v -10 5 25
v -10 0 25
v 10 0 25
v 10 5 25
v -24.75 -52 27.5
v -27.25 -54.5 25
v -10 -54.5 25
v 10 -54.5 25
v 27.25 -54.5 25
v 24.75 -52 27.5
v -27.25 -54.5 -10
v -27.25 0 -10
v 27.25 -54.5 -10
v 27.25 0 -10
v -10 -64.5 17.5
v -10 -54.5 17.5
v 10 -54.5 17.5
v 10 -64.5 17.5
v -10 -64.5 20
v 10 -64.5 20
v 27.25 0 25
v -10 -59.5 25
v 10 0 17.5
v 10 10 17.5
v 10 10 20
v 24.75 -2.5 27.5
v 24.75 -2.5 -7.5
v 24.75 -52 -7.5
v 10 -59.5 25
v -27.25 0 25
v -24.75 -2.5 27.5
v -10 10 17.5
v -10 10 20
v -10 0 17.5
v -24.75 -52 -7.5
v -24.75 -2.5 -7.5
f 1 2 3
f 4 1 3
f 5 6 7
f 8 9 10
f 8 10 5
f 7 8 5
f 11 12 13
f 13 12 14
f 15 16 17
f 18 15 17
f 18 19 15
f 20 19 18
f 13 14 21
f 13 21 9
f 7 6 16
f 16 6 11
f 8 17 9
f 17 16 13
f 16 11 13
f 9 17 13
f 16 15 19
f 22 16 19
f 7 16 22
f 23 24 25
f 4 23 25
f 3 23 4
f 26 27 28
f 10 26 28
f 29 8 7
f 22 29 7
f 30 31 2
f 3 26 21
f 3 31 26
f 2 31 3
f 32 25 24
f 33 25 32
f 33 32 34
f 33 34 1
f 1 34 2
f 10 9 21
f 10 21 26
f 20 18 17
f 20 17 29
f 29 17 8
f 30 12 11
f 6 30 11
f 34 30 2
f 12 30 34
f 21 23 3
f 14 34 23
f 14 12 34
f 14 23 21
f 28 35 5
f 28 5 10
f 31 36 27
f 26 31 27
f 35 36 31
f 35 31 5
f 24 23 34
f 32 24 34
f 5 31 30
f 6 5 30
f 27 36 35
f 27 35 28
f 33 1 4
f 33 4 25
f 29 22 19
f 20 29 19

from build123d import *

# Parameters (mm, degrees)
F0_W         = 54.5
F0_H         = 20
F1_DEPTH     = 54.5
F2_DEPTH     = 20
F3_T         = -2.5
F4_W         = 10
F4_H         = 7.5
F5_DEPTH     = 10
F6_W         = 10
F6_H         = 7.5
F7_DEPTH     = 10
F8_T1_DEPTH  = 45.7168298797
F8_T3_DEPTH  = 80.2168298797
F8_T8_DEPTH  = 80.2168298797
F8_T14_DEPTH = 80.2168298797
F8_T21_DEPTH = 80.2168298797
F8_T27_DEPTH = 80.2168298797
F8_T33_DEPTH = 80.2168298797
F8_T40_DEPTH = 80.2168298797


# Not quite as in the source:
# - a fillet or chamfer that OpenCascade refuses, or shapes differently, is made with other operations: its cross-section is extruded or revolved along the edge and cut away or added


with BuildPart() as f1:
    # F0 (on Front) → F1 (new body)
    with BuildSketch(Plane.XZ):
        Rectangle(F0_W, F0_H)
    extrude(amount=F1_DEPTH)

    # F2 (add): a face of the model
    f2_faces = [f1.faces().sort_by_distance(p)[0] for p in [
        (0, -27.25, 10),
    ]]
    extrude(f2_faces, amount=F2_DEPTH)

    # F3
    f3_openings = [f1.faces().sort_by_distance(p)[0] for p in [
        (0, -27.25, 30),
    ]]
    offset(amount=F3_T, openings=f3_openings)

    # F4 (on face) → F5 (join)
    with BuildSketch(Plane.XZ.offset(54.5)):
        with Locations((-5, 21.25)):
            Rectangle(F4_W, F4_H)
        with Locations((5, 21.25)):
            Rectangle(F4_W, F4_H)
    extrude(amount=F5_DEPTH)

    # F6 (on face) → F7 (join)
    with BuildSketch(Plane(origin=(0, 0, 0), x_dir=(-1, 0, 0), z_dir=(0, 1, 0))):
        with Locations((-5, 21.25)):
            Rectangle(F6_W, F6_H)
        with Locations((5, 21.25)):
            Rectangle(F6_W, F6_H)
    extrude(amount=F7_DEPTH)

    # F8: chamfer of 5 on 6 edges, made by hand

    # F8_s2 → F8_t1 (cut)
    with BuildSketch(Plane.YZ.offset(-22.8584149398)):
        Polygon((5, 25), (10, 20), (10, 25), align=None)
        Polygon((-59.5, 25), (-64.5, 20), (-64.5, 25), align=None)
    extrude(amount=F8_T1_DEPTH, mode=Mode.SUBTRACT)

    # F8_s4 → F8_t3 (cut)
    with BuildSketch(Plane.XZ.offset(-12.8584149398)):
        Polygon((-22.25, 30), (-27.25, 25), (-27.25, 30), align=None)
        Polygon((27.25, 25), (22.25, 30), (27.25, 30), align=None)
    extrude(amount=F8_T3_DEPTH, mode=Mode.SUBTRACT)


with BuildPart() as f8_tool6:
    # F8_s7 → F8_t8 (new body)
    with BuildSketch(Plane.YZ.offset(40.1084149398)):
        Polygon((-5, 30), (0, 25), (0, 30), align=None)
    extrude(amount=-F8_T8_DEPTH)

    split(bisect_by=Plane.YZ.offset(10), keep=Keep.TOP)

    split(bisect_by=Plane.XY.offset(25), keep=Keep.TOP)


with BuildPart() as f1_1:
    add(f1.part)

    # F8_t5: cut F8_tool6
    add(f8_tool6.part, mode=Mode.SUBTRACT)


with BuildPart() as f8_tool12:
    # F8_s13 → F8_t14 (new body)
    with BuildSketch(Plane.YZ.offset(40.1084149398)):
        Polygon((-5, 30), (0, 25), (0, 30), align=None)
    extrude(amount=-F8_T14_DEPTH)

    split(bisect_by=Plane.YZ.offset(10), keep=Keep.BOTTOM)

    split(bisect_by=Plane.XY.offset(25), keep=Keep.TOP)

    split(bisect_by=Plane.YZ.offset(-10), keep=Keep.TOP)


with BuildPart() as f1_2:
    add(f1_1.part)

    # F8_t11: cut F8_tool12
    add(f8_tool12.part, mode=Mode.SUBTRACT)


with BuildPart() as f8_tool19:
    # F8_s20 → F8_t21 (new body)
    with BuildSketch(Plane.YZ.offset(40.1084149398)):
        Polygon((-5, 30), (0, 25), (0, 30), align=None)
    extrude(amount=-F8_T21_DEPTH)

    split(bisect_by=Plane.XY.offset(25), keep=Keep.TOP)

    split(bisect_by=Plane.YZ.offset(-10), keep=Keep.BOTTOM)


with BuildPart() as f1_3:
    add(f1_2.part)

    # F8_t18: cut F8_tool19
    add(f8_tool19.part, mode=Mode.SUBTRACT)


with BuildPart() as f8_tool25:
    # F8_s26 → F8_t27 (new body)
    with BuildSketch(Plane.YZ.offset(40.1084149398)):
        Polygon((-54.5, 25), (-49.5, 30), (-54.5, 30), align=None)
    extrude(amount=-F8_T27_DEPTH)

    split(bisect_by=Plane.YZ.offset(10), keep=Keep.TOP)

    split(bisect_by=Plane.XY.offset(25), keep=Keep.TOP)


with BuildPart() as f1_4:
    add(f1_3.part)

    # F8_t24: cut F8_tool25
    add(f8_tool25.part, mode=Mode.SUBTRACT)


with BuildPart() as f8_tool31:
    # F8_s32 → F8_t33 (new body)
    with BuildSketch(Plane.YZ.offset(40.1084149398)):
        Polygon((-54.5, 25), (-49.5, 30), (-54.5, 30), align=None)
    extrude(amount=-F8_T33_DEPTH)

    split(bisect_by=Plane.YZ.offset(-10), keep=Keep.TOP)

    split(bisect_by=Plane.YZ.offset(10), keep=Keep.BOTTOM)

    split(bisect_by=Plane.XY.offset(25), keep=Keep.TOP)


with BuildPart() as f1_5:
    add(f1_4.part)

    # F8_t30: cut F8_tool31
    add(f8_tool31.part, mode=Mode.SUBTRACT)


with BuildPart() as f8_tool38:
    # F8_s39 → F8_t40 (new body)
    with BuildSketch(Plane.YZ.offset(40.1084149398)):
        Polygon((-54.5, 25), (-49.5, 30), (-54.5, 30), align=None)
    extrude(amount=-F8_T40_DEPTH)

    split(bisect_by=Plane.YZ.offset(-10), keep=Keep.BOTTOM)

    split(bisect_by=Plane.XY.offset(25), keep=Keep.TOP)


with BuildPart() as f1_6:
    add(f1_5.part)

    # F8_t37: cut F8_tool38
    add(f8_tool38.part, mode=Mode.SUBTRACT)


solid = f1_6.part
